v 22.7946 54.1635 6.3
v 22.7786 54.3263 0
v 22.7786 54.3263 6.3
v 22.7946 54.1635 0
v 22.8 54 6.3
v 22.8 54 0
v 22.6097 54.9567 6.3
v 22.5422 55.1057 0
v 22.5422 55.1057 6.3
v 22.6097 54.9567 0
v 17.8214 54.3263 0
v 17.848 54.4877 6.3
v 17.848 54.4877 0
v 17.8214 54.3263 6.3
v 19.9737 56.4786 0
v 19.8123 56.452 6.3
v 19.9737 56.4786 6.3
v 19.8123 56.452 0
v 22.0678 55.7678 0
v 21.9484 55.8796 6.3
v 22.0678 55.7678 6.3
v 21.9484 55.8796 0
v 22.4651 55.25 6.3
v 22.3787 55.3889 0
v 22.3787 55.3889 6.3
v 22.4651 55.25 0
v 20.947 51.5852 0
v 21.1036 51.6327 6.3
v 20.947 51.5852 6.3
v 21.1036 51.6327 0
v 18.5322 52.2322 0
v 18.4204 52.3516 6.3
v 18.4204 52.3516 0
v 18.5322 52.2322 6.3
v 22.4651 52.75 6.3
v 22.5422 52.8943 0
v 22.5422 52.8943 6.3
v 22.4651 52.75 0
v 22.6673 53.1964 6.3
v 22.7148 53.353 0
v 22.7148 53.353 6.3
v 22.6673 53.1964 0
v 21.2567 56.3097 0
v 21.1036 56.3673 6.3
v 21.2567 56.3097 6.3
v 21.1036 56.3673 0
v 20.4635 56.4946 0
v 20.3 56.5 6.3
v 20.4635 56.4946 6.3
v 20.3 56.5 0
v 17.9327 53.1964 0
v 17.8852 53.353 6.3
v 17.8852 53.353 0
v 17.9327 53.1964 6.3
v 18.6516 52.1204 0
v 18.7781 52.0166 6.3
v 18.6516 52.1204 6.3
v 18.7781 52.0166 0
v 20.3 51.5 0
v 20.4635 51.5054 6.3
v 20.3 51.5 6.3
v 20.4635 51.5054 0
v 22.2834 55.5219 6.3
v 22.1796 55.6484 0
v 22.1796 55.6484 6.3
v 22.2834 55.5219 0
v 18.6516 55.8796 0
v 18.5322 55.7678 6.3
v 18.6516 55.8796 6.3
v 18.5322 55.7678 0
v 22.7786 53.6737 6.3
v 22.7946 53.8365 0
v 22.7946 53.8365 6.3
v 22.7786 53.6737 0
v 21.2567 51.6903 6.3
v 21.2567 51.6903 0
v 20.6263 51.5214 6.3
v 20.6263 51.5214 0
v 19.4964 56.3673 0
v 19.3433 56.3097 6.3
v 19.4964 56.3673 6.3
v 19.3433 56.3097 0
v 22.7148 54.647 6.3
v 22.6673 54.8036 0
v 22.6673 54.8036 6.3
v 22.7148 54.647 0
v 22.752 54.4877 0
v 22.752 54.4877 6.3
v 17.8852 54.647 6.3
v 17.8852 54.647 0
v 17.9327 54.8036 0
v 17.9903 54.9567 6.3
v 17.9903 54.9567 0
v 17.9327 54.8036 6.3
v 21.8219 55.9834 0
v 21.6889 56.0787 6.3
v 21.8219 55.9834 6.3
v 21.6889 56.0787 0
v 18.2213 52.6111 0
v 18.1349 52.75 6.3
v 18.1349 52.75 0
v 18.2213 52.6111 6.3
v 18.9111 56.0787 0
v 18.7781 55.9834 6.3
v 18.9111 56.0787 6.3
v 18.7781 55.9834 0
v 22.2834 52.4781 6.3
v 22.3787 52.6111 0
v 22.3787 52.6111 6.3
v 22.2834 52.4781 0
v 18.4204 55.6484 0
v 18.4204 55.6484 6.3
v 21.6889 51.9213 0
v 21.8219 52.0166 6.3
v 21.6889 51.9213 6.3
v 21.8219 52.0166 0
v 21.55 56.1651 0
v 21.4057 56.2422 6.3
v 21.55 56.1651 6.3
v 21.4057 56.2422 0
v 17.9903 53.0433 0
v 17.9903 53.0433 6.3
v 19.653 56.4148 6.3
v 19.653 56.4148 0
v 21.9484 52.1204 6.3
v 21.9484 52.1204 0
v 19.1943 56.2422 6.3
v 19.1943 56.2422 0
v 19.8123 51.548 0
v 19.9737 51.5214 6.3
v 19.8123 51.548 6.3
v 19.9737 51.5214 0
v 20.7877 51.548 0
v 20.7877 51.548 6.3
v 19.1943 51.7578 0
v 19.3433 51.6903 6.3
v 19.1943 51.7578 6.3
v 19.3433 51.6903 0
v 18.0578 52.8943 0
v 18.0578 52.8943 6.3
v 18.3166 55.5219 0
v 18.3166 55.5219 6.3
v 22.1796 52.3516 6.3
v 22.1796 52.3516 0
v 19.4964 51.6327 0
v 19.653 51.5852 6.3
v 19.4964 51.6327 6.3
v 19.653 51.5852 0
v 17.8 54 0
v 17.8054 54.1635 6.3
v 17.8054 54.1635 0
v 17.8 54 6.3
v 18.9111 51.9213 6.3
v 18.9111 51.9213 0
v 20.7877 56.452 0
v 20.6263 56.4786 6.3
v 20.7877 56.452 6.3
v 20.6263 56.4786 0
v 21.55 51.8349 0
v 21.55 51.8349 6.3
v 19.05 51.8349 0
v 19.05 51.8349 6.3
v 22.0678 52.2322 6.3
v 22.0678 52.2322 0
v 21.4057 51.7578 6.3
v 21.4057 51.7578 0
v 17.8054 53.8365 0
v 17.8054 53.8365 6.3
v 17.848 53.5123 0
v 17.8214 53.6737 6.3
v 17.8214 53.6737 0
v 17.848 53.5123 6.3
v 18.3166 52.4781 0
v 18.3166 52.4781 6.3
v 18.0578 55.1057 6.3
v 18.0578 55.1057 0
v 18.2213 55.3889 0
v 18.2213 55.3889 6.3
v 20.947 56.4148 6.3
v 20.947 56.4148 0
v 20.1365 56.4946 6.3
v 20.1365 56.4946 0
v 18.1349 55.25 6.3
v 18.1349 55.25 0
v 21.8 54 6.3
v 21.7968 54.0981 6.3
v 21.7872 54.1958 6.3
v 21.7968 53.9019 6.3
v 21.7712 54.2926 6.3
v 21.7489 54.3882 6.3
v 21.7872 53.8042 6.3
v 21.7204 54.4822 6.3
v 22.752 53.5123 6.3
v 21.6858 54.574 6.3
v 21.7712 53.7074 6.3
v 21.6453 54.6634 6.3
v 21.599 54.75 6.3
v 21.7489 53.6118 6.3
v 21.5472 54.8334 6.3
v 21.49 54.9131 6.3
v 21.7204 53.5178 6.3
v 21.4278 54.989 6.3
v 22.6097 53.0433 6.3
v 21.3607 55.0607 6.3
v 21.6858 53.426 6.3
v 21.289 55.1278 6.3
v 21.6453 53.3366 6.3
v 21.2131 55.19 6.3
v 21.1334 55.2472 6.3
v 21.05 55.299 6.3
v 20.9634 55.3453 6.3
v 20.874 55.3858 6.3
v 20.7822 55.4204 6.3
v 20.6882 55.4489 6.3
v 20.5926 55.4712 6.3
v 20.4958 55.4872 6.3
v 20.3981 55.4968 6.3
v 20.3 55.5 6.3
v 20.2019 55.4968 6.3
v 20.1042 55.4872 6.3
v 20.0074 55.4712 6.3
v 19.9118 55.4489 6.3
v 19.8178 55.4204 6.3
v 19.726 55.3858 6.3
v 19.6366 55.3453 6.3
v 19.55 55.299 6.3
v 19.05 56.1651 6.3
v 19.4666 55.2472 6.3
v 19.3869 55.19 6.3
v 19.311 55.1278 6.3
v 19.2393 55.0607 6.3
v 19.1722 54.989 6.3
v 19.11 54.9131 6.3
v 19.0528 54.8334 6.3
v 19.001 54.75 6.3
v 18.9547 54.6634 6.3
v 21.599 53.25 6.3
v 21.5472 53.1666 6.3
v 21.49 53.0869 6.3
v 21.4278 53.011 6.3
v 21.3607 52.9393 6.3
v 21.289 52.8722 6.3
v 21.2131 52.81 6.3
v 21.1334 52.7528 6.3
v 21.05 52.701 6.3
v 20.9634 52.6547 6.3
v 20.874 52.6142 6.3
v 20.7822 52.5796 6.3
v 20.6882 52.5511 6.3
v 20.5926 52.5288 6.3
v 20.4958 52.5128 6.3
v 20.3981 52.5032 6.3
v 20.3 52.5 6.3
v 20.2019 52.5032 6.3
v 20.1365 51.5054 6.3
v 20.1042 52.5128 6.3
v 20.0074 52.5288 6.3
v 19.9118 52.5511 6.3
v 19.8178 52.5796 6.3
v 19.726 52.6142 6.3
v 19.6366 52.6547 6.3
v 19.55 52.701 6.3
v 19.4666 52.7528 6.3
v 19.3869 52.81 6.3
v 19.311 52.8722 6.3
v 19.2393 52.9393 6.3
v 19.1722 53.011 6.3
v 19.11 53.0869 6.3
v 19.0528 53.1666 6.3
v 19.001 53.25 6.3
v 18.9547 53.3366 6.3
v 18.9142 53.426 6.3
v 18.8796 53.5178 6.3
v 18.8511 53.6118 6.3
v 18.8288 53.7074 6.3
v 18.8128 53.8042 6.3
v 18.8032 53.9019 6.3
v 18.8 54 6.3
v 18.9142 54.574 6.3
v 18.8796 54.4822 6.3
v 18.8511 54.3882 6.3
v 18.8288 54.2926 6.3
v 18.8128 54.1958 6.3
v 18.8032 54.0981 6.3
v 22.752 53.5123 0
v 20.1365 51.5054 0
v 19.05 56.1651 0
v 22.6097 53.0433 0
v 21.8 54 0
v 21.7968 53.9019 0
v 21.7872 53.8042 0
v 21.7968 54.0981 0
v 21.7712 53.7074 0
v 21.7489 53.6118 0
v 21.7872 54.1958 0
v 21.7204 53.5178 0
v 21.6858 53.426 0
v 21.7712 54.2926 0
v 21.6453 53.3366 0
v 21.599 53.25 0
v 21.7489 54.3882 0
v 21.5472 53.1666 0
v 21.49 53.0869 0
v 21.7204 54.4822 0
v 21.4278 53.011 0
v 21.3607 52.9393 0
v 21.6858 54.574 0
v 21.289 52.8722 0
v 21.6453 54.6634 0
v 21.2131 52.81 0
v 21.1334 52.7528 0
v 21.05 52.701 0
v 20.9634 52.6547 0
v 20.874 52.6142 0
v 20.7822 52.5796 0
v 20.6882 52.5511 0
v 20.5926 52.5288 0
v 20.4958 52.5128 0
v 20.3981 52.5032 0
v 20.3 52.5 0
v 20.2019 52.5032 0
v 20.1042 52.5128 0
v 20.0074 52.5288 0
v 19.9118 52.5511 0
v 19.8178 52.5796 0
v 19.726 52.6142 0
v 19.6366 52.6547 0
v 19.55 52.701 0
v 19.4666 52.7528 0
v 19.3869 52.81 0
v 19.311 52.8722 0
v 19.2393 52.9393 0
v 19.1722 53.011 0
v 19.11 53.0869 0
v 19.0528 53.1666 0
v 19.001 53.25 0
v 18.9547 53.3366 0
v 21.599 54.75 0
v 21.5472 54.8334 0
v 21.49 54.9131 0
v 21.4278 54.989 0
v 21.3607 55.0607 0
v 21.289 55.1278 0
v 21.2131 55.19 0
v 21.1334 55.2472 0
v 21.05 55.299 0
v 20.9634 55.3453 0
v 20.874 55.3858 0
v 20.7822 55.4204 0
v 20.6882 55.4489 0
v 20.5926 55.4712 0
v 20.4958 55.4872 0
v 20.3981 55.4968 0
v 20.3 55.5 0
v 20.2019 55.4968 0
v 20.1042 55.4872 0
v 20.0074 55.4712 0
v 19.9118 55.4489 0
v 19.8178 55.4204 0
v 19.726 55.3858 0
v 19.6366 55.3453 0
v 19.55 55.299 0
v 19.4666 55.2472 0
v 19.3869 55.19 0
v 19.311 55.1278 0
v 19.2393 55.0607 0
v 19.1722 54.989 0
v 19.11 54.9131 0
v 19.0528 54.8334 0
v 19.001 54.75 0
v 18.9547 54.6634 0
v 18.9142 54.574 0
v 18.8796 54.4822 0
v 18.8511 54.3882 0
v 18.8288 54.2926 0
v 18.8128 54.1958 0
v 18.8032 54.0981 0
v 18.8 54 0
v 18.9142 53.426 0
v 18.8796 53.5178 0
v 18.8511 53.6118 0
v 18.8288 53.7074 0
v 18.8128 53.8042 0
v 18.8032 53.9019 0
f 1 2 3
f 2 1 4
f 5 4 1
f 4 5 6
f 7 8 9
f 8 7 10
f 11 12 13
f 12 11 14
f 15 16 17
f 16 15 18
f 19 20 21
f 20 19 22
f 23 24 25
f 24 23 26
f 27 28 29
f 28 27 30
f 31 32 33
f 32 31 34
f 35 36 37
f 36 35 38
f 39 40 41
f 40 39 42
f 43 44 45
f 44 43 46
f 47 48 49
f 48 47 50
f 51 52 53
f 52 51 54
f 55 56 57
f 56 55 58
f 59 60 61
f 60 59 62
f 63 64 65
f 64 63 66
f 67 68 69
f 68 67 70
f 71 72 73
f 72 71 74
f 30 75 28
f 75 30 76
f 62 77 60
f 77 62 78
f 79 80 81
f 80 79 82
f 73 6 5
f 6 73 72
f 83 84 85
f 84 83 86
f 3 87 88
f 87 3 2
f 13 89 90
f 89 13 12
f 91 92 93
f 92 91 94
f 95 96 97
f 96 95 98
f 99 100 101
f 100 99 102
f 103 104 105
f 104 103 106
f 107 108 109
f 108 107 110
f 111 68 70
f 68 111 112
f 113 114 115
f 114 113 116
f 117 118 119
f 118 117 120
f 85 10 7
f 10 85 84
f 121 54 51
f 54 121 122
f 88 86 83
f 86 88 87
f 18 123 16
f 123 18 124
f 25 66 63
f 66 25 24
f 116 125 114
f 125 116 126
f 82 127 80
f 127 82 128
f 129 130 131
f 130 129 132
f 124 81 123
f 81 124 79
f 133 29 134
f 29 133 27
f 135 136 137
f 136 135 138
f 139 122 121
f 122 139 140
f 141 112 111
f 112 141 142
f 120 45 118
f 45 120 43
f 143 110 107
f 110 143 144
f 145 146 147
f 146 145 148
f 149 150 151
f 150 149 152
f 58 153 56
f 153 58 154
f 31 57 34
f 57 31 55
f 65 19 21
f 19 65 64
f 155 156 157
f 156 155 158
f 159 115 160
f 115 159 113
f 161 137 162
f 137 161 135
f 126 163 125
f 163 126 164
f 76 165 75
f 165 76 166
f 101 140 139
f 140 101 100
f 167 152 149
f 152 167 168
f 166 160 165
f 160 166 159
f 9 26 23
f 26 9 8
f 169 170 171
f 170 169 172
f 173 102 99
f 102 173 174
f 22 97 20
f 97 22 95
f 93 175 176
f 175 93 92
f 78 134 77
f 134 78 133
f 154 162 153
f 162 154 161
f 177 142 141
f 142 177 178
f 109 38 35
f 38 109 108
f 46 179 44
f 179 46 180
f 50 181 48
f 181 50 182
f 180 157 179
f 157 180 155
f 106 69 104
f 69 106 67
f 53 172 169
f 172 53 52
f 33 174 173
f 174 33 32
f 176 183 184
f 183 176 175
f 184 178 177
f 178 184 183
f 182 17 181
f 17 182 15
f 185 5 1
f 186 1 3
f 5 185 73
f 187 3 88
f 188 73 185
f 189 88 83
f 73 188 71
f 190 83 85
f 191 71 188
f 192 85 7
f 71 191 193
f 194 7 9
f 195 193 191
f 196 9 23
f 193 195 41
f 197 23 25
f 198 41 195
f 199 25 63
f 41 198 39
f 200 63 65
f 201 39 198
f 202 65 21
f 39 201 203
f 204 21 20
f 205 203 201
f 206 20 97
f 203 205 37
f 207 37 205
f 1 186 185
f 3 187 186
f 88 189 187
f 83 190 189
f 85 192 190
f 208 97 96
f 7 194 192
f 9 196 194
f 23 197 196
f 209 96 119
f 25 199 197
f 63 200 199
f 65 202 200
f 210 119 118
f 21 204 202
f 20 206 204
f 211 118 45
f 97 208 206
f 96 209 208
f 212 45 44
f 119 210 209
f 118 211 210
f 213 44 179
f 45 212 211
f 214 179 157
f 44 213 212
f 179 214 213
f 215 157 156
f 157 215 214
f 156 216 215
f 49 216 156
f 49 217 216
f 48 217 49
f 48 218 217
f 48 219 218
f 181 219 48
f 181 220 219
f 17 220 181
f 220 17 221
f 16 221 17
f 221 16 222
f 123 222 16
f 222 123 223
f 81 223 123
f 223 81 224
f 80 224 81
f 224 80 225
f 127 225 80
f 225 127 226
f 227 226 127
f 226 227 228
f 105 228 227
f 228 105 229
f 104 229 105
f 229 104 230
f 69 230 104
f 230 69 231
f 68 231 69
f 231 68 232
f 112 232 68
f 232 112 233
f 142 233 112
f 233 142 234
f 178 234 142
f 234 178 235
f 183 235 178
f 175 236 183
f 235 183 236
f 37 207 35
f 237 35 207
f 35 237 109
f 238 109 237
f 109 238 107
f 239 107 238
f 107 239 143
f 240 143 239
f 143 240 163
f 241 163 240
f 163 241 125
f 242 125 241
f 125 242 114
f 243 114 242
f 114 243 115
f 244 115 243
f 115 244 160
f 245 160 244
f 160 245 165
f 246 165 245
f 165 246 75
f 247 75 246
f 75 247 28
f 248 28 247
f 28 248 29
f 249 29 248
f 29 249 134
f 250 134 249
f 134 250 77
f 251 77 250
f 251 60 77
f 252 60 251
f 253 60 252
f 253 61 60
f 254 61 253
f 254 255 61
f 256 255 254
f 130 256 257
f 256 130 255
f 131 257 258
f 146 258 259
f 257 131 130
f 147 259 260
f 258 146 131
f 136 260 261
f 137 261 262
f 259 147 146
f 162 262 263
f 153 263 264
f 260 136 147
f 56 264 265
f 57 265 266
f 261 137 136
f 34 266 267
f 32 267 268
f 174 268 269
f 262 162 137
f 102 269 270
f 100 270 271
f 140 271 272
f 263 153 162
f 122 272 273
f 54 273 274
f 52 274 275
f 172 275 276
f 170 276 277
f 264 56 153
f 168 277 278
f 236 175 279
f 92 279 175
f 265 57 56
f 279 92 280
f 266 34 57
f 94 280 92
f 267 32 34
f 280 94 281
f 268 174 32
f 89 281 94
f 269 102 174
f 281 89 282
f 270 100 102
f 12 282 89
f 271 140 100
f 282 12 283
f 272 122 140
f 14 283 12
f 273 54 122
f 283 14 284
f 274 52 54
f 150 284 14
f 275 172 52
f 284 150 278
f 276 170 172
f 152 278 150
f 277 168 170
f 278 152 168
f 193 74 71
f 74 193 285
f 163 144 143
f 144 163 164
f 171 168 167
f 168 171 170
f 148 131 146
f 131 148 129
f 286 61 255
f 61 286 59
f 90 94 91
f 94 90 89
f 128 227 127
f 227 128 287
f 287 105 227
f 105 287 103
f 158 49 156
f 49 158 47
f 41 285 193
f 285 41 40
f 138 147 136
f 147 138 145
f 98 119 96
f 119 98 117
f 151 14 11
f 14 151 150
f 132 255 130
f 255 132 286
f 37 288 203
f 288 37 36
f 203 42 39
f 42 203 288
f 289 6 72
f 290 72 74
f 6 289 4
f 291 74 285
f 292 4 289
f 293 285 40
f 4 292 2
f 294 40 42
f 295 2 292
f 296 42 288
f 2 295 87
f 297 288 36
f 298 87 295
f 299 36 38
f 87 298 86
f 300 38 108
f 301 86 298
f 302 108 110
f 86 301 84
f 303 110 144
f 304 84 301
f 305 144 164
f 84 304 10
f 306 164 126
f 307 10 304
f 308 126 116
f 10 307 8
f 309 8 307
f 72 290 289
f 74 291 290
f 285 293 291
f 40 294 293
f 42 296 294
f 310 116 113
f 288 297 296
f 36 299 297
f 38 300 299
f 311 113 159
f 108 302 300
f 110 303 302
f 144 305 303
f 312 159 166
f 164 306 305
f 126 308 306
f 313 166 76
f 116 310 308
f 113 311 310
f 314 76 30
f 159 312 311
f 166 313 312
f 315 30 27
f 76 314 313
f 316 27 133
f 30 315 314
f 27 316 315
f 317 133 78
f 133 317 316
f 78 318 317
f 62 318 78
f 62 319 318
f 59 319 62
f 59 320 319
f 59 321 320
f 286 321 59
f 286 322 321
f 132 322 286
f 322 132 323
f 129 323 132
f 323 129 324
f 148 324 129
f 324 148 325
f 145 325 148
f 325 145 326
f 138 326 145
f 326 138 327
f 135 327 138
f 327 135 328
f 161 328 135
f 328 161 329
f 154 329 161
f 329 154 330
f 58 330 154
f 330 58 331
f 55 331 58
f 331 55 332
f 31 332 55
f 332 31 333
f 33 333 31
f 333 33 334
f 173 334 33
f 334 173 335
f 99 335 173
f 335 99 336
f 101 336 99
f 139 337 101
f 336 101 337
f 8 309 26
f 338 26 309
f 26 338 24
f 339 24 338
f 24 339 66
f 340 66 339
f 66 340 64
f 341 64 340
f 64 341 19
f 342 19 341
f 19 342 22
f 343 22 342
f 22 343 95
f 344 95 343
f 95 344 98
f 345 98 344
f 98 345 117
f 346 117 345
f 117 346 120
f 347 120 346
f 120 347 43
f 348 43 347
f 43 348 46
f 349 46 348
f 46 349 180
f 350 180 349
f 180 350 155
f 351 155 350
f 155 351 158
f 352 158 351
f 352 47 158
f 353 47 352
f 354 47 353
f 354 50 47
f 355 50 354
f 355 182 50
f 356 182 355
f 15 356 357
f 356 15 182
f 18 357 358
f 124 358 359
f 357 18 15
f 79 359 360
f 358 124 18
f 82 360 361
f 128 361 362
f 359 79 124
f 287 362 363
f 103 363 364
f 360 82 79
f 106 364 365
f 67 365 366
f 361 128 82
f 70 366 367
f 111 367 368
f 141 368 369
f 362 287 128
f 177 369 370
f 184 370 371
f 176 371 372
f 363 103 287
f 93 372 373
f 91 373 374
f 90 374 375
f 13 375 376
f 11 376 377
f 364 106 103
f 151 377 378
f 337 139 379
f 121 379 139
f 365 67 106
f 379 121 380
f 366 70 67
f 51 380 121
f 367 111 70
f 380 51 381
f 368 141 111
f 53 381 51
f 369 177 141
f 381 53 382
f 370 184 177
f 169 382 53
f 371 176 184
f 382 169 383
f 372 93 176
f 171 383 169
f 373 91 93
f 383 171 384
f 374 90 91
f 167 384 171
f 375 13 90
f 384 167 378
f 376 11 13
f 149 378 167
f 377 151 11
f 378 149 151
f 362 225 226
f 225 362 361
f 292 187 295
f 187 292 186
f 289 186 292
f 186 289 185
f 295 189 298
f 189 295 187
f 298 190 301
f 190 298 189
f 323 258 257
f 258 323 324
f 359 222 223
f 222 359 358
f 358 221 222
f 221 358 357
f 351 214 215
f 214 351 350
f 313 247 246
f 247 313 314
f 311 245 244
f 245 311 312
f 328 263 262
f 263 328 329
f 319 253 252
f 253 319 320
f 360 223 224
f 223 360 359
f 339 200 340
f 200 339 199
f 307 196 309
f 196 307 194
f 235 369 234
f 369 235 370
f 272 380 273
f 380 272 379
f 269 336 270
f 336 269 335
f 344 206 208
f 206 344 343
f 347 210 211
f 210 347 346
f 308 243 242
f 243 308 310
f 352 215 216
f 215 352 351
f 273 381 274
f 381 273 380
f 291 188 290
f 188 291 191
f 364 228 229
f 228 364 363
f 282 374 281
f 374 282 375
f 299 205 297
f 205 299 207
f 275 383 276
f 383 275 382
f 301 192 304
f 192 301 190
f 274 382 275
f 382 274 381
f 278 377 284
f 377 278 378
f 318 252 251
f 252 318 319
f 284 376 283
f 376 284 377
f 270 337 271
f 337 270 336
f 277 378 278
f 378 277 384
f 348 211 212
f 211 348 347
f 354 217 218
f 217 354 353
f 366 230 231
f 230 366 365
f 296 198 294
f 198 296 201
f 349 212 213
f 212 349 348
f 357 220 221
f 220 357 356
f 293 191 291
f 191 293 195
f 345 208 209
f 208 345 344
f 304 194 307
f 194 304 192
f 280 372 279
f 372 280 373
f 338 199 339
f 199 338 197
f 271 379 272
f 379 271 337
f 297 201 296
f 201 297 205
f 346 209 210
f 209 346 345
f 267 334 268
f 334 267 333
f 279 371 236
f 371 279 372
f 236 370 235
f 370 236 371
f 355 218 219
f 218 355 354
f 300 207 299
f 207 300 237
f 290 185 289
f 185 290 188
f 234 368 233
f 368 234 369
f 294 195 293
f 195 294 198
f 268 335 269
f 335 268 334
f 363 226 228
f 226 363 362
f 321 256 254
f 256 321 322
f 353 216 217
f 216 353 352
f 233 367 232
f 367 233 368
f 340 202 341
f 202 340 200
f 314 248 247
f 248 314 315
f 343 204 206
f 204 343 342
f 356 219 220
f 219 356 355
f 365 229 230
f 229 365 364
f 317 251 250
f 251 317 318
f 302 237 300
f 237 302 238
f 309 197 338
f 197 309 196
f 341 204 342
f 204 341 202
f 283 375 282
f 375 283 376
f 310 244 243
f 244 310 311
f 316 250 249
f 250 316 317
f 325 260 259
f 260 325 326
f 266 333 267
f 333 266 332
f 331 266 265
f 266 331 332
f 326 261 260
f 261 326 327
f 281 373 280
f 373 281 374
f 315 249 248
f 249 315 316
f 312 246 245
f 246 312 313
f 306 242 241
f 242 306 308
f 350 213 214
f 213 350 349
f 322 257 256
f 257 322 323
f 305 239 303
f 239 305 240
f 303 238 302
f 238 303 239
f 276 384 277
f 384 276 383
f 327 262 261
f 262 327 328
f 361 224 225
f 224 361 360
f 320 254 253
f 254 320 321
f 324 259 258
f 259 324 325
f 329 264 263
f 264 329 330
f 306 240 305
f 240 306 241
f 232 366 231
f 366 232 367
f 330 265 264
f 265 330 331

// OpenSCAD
module paradize(){
	union(){
	translate([-0.07,0.5,0]) color("white") linear_extrude(height = 1.5) scale(0.20,0.20,1) import("paradize3.dxf");
	translate([0.19,0,1.4]) color("red") linear_extrude(height = 3.5) scale(0.20,0.20,1) import("paradize1.dxf");
	translate([-0.06,0,4.8]) color("black") linear_extrude(height = 1.5) scale(0.20,0.20,1) import("paradize2.dxf");
	}
}

difference(){
	union(){
		paradize();
		translate([20.3,54,0]) color("yellow") cylinder(r=2.5, h=6.3, $fn=96);
	}
	translate([20.3,54,-2]) color("orange") cylinder(r=1.5, h=10, $fn=96);
}
